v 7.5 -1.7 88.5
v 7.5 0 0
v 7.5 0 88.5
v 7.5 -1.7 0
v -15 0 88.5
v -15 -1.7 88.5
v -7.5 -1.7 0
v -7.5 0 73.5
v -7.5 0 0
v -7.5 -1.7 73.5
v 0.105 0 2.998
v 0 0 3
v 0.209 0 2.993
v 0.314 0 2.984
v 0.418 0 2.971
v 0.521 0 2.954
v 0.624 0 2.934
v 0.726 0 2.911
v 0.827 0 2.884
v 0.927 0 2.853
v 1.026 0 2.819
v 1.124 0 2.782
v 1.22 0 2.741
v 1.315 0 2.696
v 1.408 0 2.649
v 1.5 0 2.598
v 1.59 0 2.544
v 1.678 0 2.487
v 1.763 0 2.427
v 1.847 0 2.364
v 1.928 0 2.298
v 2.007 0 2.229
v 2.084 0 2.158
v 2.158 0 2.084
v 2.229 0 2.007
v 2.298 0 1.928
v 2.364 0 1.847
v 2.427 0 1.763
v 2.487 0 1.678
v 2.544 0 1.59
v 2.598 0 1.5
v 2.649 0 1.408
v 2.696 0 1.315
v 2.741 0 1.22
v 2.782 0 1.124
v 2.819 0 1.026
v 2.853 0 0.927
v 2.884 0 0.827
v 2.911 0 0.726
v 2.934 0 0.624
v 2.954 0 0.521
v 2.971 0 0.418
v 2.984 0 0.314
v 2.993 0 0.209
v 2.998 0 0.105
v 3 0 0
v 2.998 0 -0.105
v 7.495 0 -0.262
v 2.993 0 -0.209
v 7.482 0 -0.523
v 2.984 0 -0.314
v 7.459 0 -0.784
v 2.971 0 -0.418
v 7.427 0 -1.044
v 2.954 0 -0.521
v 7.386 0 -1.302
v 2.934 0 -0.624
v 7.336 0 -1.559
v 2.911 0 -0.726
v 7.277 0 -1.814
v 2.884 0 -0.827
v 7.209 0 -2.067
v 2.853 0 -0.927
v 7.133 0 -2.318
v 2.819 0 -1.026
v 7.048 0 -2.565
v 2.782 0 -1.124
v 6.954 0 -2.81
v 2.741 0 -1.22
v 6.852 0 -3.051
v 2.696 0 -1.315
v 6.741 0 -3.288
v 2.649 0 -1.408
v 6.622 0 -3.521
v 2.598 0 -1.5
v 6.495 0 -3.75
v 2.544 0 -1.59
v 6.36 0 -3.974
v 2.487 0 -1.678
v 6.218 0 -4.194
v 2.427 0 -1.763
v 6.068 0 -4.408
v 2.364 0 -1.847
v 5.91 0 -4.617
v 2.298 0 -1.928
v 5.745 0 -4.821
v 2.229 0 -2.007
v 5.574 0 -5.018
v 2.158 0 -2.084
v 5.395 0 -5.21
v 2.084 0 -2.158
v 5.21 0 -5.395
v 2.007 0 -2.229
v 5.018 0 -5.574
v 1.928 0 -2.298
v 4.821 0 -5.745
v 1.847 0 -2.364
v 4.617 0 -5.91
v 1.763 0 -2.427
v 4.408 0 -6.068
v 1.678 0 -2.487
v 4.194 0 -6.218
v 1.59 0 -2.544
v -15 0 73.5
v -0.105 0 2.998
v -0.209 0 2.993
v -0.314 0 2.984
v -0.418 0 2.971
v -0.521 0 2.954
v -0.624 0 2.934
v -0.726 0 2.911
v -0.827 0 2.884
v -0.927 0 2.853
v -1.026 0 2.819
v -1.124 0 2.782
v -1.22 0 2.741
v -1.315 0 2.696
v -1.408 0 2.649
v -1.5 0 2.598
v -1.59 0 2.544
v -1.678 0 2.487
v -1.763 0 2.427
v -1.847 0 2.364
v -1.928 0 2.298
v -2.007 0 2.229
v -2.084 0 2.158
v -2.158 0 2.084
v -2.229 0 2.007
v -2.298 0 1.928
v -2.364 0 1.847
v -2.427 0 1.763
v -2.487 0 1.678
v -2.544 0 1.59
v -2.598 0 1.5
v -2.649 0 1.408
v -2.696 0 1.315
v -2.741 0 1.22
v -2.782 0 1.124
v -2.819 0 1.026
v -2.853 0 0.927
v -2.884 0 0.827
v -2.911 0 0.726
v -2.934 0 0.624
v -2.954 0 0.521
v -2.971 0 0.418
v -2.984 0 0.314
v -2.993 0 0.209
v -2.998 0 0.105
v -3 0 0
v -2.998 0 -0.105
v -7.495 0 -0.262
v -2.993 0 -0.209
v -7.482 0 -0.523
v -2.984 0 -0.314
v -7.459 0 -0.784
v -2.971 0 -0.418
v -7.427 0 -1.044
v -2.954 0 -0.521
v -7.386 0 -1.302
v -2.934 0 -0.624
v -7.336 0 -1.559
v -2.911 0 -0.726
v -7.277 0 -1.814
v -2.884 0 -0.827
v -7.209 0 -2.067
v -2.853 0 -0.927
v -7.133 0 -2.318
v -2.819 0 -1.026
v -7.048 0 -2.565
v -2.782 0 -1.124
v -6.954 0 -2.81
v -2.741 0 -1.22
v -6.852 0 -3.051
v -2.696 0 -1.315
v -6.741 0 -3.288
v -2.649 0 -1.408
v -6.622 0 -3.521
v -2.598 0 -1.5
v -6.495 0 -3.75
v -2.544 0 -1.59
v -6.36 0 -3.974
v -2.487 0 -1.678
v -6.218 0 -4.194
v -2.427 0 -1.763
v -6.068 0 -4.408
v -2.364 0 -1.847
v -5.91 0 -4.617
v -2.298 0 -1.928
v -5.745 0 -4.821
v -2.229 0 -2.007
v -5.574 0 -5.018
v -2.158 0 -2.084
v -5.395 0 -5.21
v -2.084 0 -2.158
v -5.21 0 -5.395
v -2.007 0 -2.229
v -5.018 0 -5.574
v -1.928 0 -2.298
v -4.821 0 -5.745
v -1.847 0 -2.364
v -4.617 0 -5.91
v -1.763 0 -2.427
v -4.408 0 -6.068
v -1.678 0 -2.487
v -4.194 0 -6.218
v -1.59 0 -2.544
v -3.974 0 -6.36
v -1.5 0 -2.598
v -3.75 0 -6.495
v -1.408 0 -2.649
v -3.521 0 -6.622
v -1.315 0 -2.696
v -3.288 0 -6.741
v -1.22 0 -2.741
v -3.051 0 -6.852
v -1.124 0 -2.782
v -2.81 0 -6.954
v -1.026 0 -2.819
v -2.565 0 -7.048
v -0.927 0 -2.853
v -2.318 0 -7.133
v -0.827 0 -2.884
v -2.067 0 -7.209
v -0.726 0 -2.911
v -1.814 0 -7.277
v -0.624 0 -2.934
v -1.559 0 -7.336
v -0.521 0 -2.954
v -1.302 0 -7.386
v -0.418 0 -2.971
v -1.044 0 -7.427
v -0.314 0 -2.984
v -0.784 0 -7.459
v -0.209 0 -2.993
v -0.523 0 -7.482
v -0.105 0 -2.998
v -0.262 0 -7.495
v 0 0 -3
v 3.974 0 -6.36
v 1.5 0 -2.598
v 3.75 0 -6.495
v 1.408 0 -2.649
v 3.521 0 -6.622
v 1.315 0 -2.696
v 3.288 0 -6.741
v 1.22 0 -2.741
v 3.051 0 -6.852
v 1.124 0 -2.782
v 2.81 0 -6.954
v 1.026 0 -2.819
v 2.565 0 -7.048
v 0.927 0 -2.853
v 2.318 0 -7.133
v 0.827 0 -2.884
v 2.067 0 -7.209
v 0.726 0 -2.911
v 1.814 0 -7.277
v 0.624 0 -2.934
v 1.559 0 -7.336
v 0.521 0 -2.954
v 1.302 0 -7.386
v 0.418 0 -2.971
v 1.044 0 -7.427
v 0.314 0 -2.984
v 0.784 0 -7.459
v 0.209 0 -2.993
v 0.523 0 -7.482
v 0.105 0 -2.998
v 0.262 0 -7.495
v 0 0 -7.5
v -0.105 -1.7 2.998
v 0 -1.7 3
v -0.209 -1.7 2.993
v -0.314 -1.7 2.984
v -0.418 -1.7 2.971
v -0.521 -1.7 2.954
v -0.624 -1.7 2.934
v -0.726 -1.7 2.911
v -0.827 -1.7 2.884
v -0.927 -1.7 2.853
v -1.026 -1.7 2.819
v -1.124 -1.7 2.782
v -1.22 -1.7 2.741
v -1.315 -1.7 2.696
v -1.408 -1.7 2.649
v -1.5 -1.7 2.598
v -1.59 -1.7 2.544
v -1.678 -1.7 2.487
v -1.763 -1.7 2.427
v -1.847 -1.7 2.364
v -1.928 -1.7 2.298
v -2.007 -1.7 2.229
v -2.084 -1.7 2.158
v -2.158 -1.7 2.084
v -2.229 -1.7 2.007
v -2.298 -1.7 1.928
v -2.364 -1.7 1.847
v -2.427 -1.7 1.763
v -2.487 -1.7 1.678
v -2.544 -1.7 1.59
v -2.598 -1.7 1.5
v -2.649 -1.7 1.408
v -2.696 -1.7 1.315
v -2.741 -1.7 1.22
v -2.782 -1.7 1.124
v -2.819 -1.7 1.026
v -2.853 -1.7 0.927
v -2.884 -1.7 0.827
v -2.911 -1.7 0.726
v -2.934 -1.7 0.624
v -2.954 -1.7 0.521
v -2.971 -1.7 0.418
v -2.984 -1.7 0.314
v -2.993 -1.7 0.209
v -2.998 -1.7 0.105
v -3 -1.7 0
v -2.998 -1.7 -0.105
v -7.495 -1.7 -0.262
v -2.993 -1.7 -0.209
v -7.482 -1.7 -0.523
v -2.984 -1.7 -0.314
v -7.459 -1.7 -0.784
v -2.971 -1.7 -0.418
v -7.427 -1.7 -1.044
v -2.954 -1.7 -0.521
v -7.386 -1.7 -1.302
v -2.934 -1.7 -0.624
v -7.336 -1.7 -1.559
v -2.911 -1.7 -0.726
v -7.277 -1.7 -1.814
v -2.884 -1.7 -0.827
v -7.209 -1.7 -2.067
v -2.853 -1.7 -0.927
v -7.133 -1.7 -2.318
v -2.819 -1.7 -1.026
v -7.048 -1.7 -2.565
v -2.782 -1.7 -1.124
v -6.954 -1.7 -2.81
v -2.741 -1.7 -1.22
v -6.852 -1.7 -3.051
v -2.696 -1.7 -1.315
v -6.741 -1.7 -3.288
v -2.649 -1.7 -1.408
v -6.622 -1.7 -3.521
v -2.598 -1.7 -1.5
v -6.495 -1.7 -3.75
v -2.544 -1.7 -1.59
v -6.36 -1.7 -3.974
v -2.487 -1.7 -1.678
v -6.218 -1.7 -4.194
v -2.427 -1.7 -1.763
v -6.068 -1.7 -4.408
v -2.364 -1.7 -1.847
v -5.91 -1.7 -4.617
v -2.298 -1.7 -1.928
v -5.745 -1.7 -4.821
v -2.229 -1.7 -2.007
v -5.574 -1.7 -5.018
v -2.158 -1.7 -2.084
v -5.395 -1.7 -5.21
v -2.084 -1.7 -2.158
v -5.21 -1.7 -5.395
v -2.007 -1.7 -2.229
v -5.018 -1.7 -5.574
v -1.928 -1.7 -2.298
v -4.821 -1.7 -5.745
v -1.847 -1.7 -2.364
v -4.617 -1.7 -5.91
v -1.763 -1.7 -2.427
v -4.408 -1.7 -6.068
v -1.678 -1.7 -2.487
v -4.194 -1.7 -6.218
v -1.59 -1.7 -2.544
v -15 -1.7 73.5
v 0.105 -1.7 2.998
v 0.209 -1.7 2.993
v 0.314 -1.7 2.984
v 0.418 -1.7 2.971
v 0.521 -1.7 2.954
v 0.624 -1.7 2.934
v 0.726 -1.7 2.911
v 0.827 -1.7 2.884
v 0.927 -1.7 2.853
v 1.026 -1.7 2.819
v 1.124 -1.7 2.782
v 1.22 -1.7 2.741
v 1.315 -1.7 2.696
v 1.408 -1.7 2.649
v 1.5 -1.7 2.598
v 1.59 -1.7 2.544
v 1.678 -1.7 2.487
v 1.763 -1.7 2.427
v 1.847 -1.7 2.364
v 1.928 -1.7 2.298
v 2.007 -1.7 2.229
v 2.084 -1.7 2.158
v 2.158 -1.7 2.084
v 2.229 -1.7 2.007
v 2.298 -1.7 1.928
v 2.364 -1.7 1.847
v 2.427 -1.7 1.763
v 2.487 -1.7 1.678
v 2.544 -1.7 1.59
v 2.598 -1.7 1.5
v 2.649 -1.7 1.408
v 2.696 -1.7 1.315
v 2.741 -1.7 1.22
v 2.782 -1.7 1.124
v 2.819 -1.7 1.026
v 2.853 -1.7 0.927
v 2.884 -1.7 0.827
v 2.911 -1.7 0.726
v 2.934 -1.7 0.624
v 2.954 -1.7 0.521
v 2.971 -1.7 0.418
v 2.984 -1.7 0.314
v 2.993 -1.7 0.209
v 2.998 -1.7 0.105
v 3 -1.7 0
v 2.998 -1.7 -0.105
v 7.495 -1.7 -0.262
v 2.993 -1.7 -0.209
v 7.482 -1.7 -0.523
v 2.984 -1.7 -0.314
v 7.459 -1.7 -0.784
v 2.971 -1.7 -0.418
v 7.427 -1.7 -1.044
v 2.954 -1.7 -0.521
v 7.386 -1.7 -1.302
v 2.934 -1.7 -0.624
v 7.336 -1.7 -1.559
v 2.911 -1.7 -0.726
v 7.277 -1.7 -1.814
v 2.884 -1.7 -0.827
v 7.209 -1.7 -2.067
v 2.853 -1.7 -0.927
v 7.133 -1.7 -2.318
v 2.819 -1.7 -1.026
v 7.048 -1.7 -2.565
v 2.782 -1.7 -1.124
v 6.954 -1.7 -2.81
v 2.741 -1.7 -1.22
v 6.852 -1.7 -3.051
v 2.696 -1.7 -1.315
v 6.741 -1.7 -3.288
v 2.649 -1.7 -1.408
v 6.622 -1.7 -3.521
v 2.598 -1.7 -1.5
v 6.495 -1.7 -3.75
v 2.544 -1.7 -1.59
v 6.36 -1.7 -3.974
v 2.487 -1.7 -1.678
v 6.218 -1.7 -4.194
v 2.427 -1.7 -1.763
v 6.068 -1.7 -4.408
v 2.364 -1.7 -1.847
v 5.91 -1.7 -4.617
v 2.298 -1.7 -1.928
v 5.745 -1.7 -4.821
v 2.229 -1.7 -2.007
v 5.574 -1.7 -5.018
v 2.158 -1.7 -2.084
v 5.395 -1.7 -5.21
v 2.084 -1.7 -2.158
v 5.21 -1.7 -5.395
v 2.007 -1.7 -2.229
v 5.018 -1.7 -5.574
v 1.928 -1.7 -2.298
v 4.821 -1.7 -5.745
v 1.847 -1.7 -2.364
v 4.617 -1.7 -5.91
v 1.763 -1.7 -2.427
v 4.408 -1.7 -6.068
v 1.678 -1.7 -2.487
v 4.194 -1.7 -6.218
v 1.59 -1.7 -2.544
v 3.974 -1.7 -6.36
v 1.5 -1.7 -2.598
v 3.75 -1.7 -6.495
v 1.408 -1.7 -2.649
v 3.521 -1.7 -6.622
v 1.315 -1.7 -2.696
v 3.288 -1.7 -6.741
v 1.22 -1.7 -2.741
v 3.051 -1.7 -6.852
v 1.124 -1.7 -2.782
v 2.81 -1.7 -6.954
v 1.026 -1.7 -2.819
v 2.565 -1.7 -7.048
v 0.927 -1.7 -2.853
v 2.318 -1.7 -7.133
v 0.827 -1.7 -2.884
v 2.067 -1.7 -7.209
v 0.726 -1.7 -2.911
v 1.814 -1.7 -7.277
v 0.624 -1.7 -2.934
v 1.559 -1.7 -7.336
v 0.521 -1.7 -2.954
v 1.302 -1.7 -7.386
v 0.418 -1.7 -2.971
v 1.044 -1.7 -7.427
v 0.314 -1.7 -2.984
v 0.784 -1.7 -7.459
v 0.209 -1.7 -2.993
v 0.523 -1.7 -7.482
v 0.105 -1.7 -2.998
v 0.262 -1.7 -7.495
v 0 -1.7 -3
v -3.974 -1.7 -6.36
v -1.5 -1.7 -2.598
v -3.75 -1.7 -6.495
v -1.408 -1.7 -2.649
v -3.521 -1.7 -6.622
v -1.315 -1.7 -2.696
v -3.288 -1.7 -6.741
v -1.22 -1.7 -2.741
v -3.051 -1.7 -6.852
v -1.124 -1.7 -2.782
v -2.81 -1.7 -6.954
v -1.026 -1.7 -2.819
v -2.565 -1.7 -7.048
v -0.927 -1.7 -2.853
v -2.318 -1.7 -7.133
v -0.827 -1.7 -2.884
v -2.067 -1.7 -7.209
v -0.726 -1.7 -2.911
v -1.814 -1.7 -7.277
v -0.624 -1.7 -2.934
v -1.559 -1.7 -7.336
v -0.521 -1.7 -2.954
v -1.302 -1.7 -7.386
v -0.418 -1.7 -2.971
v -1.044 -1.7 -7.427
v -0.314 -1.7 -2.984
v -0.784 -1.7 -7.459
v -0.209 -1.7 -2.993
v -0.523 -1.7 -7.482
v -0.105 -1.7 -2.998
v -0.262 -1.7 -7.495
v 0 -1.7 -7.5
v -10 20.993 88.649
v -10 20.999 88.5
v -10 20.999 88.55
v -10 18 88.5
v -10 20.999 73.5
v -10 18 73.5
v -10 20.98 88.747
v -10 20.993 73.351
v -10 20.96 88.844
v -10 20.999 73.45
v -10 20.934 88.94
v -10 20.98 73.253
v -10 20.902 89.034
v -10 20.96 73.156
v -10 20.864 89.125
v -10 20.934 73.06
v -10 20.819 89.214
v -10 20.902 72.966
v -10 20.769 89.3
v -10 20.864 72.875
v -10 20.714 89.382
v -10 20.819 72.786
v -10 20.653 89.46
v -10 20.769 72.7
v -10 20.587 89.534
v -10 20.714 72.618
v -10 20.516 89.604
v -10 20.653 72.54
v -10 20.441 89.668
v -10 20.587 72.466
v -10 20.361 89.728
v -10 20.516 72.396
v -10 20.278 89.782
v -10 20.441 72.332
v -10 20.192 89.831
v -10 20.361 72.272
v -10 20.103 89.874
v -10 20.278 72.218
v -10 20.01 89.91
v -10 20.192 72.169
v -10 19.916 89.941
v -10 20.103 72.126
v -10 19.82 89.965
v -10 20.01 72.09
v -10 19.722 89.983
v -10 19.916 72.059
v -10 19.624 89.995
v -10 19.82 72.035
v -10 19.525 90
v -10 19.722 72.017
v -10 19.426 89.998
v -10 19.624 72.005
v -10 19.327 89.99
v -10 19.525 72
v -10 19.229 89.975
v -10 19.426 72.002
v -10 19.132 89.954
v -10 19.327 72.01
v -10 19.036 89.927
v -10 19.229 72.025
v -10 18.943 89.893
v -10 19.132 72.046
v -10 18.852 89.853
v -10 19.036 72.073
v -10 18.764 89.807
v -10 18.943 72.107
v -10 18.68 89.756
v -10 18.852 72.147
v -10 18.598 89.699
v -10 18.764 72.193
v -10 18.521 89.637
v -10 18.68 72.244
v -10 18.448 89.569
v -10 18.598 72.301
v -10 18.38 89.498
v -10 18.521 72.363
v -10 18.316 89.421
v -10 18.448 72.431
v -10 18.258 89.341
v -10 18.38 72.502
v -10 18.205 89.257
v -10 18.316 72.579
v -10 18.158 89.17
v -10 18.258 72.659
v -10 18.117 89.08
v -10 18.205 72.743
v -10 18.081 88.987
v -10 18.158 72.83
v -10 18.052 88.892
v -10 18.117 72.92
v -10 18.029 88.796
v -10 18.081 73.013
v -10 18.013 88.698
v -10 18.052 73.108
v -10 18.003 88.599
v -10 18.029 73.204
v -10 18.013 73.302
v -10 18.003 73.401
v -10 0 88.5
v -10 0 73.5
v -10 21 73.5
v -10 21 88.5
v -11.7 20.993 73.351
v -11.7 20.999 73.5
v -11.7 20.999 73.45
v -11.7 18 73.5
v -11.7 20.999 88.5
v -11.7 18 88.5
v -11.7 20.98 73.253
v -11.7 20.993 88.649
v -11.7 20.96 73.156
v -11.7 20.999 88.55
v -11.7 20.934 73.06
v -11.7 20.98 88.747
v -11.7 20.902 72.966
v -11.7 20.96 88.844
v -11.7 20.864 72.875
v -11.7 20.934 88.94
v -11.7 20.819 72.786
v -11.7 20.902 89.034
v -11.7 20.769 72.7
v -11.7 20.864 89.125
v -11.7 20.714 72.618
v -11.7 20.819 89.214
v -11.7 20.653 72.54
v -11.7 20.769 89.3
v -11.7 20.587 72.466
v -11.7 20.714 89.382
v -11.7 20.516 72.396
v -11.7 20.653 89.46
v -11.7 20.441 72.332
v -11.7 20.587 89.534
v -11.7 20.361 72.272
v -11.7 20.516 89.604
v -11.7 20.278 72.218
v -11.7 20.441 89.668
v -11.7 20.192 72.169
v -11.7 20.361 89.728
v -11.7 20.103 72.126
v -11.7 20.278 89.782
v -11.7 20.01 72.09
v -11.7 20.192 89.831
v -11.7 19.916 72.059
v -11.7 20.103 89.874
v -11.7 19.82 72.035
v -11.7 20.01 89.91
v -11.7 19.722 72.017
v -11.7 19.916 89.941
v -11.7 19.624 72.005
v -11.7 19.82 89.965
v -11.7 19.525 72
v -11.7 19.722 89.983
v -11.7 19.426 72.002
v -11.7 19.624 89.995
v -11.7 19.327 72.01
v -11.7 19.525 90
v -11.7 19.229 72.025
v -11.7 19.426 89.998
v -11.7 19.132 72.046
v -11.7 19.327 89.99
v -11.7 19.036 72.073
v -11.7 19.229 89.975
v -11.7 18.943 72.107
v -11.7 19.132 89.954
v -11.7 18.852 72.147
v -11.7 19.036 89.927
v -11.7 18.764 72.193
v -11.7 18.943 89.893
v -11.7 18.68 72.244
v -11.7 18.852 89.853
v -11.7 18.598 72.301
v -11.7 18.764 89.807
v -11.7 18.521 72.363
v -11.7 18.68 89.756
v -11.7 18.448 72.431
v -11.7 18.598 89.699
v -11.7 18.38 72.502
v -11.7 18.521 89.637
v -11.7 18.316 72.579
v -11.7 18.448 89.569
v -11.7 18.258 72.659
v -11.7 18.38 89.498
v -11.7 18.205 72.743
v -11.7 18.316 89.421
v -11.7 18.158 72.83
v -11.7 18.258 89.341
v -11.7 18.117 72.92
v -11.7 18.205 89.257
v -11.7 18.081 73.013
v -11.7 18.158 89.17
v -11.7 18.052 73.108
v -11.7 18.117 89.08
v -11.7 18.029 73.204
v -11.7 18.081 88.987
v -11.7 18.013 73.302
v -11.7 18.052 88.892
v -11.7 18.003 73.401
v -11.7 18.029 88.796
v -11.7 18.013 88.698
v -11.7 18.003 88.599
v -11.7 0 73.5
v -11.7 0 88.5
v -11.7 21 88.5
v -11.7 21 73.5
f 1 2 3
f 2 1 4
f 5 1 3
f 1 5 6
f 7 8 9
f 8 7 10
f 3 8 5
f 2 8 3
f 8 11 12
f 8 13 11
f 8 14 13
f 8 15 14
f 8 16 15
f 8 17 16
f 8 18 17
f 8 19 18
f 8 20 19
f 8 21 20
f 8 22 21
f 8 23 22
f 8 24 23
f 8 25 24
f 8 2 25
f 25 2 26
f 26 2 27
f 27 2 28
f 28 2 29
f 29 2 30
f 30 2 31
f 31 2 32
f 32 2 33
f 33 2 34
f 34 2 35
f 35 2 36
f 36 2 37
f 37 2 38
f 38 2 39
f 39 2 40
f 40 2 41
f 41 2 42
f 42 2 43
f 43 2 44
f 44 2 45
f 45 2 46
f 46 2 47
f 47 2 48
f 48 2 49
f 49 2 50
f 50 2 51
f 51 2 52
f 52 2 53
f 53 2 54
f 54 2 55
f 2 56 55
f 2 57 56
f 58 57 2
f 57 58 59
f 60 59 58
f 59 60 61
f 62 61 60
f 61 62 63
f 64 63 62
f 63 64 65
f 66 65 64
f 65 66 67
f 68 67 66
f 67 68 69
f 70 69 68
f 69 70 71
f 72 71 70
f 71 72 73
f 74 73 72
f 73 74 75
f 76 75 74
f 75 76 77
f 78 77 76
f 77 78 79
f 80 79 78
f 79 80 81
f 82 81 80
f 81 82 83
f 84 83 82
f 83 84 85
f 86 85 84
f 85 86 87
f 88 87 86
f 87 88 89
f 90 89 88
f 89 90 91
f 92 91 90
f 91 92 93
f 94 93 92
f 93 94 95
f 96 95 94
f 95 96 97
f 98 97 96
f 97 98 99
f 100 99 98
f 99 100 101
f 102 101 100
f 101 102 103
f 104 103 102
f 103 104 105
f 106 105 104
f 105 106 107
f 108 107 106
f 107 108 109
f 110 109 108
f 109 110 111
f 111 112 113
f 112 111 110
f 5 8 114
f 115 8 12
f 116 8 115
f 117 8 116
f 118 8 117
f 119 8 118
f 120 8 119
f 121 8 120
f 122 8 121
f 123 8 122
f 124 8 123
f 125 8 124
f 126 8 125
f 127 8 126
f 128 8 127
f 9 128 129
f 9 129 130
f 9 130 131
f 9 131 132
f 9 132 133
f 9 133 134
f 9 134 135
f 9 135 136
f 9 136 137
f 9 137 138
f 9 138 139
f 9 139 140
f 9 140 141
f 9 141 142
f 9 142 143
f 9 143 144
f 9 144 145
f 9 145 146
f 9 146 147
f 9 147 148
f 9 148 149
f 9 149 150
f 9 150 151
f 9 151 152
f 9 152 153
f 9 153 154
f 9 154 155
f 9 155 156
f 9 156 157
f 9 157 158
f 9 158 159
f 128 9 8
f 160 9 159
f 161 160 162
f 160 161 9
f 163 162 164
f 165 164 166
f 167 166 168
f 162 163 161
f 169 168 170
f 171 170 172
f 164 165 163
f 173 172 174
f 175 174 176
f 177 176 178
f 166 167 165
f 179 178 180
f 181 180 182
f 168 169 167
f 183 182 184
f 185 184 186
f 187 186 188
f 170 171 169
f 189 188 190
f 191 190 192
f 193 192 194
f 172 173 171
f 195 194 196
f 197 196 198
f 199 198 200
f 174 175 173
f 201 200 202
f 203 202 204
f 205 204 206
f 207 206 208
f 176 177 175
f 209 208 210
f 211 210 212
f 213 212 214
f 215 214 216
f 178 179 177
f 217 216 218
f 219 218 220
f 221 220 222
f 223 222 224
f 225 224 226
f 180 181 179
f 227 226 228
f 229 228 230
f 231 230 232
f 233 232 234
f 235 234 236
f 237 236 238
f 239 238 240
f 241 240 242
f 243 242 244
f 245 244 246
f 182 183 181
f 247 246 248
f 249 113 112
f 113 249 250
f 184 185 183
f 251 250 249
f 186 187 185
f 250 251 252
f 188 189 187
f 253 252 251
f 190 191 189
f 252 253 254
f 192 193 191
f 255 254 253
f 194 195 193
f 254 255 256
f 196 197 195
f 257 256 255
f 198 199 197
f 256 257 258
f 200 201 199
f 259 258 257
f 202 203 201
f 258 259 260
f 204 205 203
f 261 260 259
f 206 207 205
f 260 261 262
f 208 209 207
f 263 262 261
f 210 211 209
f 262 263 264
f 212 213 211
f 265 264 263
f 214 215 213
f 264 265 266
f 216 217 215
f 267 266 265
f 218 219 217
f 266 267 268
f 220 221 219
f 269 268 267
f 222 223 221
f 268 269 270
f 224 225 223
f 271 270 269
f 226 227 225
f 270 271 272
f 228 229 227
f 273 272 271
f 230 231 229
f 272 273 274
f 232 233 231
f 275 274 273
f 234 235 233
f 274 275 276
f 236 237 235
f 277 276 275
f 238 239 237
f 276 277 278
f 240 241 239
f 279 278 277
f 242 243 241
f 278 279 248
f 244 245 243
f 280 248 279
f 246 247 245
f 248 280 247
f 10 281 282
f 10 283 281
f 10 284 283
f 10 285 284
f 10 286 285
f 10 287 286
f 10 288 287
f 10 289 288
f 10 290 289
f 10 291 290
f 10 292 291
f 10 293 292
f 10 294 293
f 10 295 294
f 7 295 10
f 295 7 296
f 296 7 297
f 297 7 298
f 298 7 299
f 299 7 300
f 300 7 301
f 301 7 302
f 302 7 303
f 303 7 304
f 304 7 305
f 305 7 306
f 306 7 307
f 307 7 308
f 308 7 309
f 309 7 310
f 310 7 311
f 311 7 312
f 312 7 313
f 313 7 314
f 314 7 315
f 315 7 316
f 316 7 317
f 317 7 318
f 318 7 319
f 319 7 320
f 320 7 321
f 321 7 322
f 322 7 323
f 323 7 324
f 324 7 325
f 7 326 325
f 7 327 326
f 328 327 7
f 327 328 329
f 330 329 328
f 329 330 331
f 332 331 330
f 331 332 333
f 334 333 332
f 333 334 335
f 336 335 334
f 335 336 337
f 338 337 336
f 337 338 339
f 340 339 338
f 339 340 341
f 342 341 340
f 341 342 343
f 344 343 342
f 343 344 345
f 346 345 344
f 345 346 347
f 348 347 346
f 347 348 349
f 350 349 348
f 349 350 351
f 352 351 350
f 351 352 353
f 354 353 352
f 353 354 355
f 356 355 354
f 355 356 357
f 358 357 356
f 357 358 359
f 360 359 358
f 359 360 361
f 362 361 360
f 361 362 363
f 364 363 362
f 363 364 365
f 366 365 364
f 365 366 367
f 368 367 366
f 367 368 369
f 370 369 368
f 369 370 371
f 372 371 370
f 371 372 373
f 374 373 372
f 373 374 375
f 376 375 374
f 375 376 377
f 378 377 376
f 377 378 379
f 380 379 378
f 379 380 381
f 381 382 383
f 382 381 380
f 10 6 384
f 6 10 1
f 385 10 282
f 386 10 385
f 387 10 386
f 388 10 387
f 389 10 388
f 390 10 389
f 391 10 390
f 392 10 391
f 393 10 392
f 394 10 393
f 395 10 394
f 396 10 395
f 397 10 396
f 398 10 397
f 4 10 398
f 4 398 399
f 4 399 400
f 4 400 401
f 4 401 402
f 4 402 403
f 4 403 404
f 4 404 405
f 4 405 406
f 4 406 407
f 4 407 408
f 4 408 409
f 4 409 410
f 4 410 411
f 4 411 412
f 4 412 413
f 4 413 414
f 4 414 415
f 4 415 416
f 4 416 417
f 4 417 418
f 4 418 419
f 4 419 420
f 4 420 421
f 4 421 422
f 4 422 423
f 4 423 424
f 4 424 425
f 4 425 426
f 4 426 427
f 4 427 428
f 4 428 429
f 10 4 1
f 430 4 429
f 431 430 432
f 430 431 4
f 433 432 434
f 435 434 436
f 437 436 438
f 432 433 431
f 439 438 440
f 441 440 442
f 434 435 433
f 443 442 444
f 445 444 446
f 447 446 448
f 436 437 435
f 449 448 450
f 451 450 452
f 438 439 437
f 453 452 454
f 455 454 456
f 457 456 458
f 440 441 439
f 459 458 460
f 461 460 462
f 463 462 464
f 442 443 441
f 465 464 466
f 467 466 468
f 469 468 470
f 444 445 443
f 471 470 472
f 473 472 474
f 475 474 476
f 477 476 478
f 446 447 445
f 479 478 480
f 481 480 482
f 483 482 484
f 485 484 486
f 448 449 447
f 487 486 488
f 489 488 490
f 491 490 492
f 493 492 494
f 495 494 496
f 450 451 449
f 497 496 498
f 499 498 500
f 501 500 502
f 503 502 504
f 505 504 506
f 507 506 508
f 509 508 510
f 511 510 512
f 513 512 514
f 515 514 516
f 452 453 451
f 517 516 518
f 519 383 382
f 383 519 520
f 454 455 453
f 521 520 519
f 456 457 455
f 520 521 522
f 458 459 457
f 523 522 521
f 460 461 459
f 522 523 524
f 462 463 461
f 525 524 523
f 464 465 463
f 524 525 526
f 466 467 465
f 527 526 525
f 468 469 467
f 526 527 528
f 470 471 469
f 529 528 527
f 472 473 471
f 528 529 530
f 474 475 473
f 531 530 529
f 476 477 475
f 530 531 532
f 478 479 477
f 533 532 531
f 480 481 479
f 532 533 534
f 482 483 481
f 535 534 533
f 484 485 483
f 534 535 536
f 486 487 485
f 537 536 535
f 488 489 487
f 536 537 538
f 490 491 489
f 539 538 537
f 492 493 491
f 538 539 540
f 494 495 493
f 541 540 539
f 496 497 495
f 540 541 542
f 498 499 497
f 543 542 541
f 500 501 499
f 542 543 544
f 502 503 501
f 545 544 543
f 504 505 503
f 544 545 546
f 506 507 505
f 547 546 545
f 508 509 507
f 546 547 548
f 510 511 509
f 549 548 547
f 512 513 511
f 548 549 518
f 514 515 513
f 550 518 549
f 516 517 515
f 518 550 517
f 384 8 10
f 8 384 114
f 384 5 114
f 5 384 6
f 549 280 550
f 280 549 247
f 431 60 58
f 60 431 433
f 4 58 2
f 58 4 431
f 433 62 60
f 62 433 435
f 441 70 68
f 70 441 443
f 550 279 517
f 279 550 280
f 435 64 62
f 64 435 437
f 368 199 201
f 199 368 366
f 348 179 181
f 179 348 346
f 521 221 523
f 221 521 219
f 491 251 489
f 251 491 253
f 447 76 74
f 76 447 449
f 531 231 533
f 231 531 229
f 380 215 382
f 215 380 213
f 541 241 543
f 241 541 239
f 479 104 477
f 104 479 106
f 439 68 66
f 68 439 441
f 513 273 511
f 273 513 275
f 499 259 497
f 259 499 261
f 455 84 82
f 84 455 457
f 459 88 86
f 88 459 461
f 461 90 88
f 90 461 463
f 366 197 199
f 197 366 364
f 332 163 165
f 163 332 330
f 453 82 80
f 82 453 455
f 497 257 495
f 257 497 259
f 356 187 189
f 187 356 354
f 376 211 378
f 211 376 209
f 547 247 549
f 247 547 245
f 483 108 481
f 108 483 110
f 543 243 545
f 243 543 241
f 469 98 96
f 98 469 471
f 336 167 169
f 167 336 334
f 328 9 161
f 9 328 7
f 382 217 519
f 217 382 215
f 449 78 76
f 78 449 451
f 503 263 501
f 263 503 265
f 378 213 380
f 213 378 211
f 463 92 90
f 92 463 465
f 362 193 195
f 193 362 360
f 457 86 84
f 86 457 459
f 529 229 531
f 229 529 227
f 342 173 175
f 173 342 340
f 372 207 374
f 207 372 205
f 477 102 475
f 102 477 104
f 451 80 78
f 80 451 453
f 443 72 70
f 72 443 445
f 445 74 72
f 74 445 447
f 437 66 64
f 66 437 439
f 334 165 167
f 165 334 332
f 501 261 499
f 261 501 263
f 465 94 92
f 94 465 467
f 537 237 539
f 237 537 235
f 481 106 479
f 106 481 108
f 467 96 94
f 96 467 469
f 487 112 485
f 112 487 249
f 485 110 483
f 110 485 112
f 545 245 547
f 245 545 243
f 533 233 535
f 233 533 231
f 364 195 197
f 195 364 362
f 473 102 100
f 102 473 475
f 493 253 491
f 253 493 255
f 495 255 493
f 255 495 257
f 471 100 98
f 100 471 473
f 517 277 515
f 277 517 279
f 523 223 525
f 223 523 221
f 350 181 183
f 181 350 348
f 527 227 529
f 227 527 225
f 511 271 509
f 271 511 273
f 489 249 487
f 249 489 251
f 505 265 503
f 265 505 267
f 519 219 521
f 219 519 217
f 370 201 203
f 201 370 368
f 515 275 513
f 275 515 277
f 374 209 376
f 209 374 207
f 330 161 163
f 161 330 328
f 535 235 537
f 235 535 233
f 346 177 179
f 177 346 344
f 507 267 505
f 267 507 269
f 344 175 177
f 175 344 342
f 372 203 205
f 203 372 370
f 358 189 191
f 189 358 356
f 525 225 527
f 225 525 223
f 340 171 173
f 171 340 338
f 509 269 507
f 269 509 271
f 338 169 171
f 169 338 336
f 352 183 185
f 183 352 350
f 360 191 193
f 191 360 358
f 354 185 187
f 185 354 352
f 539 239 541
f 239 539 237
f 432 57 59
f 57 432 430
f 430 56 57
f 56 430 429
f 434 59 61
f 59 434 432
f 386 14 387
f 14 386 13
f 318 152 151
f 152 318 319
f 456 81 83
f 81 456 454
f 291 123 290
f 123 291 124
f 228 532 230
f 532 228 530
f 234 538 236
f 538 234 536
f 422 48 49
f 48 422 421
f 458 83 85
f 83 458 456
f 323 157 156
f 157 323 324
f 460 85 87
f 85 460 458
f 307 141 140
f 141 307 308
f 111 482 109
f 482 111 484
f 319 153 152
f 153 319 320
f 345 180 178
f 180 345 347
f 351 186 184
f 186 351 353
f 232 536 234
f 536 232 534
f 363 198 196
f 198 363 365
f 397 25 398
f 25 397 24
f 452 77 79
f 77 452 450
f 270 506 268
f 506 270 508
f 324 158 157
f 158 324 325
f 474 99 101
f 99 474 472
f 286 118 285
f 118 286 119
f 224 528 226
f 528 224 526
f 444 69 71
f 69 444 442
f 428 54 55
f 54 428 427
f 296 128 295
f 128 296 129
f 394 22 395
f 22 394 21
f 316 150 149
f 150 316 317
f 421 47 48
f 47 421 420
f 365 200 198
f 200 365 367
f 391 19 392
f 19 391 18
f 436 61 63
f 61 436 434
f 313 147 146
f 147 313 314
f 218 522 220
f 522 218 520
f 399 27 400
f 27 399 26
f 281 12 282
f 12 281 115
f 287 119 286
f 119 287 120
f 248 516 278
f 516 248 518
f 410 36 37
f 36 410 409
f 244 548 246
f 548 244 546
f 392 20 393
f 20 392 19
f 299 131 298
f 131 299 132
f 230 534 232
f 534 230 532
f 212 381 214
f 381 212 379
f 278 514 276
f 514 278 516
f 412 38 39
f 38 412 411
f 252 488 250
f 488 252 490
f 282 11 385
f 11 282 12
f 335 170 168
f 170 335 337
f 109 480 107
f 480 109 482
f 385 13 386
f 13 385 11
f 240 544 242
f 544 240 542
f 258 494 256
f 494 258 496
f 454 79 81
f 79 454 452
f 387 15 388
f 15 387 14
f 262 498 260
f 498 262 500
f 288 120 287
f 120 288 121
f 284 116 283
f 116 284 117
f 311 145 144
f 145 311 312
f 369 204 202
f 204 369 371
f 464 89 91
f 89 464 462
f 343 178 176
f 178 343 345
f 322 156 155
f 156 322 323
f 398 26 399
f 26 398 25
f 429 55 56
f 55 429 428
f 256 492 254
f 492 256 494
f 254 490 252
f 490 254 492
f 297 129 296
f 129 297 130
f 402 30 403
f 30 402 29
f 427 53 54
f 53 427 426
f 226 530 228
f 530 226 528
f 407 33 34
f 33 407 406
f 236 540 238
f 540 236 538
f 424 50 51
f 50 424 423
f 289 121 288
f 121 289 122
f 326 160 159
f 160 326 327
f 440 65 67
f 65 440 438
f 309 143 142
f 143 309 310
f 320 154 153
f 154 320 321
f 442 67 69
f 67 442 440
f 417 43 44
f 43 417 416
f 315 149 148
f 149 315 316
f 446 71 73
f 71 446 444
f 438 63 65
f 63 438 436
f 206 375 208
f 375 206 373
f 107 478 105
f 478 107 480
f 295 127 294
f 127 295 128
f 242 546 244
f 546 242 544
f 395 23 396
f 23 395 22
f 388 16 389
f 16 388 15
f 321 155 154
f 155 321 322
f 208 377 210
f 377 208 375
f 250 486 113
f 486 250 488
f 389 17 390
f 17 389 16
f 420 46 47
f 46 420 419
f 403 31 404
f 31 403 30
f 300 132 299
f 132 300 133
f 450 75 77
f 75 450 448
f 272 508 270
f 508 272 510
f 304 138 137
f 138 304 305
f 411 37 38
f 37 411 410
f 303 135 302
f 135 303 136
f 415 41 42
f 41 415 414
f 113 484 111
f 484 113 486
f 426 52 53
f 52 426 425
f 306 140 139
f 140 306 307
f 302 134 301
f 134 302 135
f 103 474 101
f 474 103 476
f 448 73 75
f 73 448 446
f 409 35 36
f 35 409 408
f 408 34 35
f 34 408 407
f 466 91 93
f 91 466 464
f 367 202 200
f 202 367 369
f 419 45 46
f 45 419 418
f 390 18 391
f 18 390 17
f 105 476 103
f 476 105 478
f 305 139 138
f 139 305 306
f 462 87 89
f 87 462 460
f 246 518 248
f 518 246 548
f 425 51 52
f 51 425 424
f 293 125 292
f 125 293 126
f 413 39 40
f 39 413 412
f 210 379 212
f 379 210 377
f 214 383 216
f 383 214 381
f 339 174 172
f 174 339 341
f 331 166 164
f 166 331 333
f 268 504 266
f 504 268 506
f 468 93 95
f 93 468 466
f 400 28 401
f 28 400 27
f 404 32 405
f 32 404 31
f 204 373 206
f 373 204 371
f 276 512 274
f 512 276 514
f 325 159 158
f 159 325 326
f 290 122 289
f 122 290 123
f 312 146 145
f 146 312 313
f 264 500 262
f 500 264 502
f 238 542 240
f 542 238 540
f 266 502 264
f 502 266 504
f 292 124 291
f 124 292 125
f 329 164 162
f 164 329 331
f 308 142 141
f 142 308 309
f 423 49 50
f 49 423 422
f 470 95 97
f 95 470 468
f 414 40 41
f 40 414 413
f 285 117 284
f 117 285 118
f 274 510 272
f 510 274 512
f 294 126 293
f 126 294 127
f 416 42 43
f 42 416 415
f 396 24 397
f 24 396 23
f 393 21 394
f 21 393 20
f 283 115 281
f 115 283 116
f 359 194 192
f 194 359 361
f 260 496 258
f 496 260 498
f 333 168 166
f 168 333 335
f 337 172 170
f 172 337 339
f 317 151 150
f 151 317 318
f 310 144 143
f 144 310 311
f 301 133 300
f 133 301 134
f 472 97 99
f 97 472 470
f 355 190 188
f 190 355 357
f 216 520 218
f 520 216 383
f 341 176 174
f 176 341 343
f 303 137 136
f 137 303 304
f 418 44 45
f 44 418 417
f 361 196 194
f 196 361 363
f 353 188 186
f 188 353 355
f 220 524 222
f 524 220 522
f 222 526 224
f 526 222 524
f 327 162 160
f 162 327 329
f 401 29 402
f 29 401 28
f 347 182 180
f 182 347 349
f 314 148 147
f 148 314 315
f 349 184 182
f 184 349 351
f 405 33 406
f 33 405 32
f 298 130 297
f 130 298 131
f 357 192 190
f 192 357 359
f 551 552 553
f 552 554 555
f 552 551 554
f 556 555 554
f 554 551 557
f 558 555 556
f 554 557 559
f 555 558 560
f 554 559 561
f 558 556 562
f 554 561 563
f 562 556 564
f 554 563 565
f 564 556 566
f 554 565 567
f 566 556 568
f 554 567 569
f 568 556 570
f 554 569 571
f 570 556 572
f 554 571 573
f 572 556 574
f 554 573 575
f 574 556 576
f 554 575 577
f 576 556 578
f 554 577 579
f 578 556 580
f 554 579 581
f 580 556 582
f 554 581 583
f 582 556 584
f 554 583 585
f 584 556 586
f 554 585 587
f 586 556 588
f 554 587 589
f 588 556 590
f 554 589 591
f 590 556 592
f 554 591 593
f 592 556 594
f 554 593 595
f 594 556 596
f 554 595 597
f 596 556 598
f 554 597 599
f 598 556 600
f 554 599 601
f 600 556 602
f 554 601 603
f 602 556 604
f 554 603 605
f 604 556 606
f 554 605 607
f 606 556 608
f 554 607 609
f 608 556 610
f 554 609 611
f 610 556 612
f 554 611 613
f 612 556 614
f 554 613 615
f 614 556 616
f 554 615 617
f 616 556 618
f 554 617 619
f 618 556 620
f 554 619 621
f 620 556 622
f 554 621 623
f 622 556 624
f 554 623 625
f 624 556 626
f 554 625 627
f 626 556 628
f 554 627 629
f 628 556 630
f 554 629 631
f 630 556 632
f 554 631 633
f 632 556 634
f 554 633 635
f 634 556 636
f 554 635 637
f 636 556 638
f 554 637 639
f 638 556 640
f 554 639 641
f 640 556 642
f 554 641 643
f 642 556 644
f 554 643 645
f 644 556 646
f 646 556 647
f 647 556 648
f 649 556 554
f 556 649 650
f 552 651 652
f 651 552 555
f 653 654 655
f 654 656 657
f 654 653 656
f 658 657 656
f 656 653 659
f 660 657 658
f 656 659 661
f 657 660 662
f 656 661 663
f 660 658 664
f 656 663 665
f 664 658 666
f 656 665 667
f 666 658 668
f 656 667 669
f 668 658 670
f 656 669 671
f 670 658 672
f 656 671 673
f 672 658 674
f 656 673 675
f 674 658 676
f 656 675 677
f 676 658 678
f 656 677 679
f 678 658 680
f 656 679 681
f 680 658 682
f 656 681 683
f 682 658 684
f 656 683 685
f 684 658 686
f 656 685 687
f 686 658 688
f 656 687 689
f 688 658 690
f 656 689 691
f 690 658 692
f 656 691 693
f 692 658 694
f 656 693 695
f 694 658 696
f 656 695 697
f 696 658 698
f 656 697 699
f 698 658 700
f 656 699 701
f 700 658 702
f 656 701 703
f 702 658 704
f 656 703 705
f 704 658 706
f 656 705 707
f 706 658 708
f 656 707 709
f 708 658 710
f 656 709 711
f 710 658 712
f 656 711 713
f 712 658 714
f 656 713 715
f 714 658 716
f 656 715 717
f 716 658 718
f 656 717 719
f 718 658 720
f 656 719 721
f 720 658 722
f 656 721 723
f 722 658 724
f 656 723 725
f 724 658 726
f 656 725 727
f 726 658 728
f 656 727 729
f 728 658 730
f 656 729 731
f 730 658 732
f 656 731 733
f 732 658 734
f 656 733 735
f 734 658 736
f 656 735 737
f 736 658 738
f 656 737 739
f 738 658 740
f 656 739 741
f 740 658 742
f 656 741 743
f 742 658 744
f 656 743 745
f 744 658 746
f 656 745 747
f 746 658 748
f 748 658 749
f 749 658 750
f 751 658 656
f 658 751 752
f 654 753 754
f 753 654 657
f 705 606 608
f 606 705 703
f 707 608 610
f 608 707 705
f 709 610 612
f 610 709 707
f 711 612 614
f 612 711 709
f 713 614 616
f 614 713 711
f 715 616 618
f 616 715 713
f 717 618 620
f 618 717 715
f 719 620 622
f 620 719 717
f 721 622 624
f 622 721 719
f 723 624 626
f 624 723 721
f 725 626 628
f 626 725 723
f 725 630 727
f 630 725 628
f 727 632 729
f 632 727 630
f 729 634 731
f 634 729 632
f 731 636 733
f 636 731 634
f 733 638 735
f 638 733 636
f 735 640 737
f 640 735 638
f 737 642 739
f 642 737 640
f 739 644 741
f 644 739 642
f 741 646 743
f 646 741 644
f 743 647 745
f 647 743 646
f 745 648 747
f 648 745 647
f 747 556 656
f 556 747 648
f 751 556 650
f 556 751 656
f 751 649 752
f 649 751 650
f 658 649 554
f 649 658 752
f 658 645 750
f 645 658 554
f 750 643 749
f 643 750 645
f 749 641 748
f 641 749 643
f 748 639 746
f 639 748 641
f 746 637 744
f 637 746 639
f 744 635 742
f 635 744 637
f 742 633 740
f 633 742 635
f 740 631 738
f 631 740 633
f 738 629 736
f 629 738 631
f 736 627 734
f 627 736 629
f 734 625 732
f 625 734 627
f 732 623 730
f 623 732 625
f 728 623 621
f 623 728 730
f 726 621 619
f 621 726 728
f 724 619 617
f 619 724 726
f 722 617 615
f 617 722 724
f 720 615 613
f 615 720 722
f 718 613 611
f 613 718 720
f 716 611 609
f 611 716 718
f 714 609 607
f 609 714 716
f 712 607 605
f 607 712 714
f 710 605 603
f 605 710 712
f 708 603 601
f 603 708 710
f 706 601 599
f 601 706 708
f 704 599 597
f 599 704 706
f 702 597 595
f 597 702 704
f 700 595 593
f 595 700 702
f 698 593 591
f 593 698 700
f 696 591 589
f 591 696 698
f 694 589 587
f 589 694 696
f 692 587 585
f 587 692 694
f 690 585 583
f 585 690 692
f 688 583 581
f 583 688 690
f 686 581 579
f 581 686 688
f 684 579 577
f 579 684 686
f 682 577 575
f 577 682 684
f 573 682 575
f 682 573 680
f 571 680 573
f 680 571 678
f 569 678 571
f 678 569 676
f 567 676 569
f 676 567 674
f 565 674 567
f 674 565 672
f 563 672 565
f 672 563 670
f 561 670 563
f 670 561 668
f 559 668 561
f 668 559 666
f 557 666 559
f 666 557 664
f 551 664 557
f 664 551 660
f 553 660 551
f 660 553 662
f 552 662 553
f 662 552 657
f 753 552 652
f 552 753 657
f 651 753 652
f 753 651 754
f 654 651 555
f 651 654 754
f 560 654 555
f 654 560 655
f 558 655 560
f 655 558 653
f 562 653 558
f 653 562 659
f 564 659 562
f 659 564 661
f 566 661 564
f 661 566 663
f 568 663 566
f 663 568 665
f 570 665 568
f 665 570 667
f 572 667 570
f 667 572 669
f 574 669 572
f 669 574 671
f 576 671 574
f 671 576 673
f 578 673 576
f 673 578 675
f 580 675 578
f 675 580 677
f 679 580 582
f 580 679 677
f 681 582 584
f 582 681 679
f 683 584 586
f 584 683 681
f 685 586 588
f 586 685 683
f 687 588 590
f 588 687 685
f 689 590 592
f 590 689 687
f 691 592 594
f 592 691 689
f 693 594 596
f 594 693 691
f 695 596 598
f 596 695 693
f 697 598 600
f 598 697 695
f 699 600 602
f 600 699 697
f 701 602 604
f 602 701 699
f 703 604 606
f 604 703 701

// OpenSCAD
$fa=2;
$fs=.1;

mntHoleR = 3;
mntHoleToBarbCenterH=81;
barbOffsetX=10;
barbW1=15;
barbW2=18;
barbT=1.7;
barbStep=(barbW2-barbW1)/2;
barbOaL=21;

translate([-barbOffsetX,0,mntHoleToBarbCenterH-barbW1/2])
    rotate(a=[0,0,-90])
        rotate(a=[90,0,0])
            translate([-barbOaL,0,0])
                barb();

translate([0,-barbT,0]){
    difference(){
        union(){
            translate([-barbW1/2,0,0])
                cube([barbW1,barbT,mntHoleToBarbCenterH+barbW1/2]);
            translate([-barbOffsetX-5,0,mntHoleToBarbCenterH-barbW1/2])
                cube([barbOffsetX+5,barbT,barbW1]);
            rotate(a=[-90,0,0])
                cylinder(d=barbW1,h=barbT);
        }
        rotate(a=[-90,0,0])
            cylinder(r=mntHoleR,h=barbT);
    }
}

module barb(){
    linear_extrude(height=barbT){
        square([barbOaL,barbW1]);
        translate([barbStep,0])
            circle(r=barbStep);
        translate([barbStep,barbW1])
            circle(r=barbStep);
    }
}
